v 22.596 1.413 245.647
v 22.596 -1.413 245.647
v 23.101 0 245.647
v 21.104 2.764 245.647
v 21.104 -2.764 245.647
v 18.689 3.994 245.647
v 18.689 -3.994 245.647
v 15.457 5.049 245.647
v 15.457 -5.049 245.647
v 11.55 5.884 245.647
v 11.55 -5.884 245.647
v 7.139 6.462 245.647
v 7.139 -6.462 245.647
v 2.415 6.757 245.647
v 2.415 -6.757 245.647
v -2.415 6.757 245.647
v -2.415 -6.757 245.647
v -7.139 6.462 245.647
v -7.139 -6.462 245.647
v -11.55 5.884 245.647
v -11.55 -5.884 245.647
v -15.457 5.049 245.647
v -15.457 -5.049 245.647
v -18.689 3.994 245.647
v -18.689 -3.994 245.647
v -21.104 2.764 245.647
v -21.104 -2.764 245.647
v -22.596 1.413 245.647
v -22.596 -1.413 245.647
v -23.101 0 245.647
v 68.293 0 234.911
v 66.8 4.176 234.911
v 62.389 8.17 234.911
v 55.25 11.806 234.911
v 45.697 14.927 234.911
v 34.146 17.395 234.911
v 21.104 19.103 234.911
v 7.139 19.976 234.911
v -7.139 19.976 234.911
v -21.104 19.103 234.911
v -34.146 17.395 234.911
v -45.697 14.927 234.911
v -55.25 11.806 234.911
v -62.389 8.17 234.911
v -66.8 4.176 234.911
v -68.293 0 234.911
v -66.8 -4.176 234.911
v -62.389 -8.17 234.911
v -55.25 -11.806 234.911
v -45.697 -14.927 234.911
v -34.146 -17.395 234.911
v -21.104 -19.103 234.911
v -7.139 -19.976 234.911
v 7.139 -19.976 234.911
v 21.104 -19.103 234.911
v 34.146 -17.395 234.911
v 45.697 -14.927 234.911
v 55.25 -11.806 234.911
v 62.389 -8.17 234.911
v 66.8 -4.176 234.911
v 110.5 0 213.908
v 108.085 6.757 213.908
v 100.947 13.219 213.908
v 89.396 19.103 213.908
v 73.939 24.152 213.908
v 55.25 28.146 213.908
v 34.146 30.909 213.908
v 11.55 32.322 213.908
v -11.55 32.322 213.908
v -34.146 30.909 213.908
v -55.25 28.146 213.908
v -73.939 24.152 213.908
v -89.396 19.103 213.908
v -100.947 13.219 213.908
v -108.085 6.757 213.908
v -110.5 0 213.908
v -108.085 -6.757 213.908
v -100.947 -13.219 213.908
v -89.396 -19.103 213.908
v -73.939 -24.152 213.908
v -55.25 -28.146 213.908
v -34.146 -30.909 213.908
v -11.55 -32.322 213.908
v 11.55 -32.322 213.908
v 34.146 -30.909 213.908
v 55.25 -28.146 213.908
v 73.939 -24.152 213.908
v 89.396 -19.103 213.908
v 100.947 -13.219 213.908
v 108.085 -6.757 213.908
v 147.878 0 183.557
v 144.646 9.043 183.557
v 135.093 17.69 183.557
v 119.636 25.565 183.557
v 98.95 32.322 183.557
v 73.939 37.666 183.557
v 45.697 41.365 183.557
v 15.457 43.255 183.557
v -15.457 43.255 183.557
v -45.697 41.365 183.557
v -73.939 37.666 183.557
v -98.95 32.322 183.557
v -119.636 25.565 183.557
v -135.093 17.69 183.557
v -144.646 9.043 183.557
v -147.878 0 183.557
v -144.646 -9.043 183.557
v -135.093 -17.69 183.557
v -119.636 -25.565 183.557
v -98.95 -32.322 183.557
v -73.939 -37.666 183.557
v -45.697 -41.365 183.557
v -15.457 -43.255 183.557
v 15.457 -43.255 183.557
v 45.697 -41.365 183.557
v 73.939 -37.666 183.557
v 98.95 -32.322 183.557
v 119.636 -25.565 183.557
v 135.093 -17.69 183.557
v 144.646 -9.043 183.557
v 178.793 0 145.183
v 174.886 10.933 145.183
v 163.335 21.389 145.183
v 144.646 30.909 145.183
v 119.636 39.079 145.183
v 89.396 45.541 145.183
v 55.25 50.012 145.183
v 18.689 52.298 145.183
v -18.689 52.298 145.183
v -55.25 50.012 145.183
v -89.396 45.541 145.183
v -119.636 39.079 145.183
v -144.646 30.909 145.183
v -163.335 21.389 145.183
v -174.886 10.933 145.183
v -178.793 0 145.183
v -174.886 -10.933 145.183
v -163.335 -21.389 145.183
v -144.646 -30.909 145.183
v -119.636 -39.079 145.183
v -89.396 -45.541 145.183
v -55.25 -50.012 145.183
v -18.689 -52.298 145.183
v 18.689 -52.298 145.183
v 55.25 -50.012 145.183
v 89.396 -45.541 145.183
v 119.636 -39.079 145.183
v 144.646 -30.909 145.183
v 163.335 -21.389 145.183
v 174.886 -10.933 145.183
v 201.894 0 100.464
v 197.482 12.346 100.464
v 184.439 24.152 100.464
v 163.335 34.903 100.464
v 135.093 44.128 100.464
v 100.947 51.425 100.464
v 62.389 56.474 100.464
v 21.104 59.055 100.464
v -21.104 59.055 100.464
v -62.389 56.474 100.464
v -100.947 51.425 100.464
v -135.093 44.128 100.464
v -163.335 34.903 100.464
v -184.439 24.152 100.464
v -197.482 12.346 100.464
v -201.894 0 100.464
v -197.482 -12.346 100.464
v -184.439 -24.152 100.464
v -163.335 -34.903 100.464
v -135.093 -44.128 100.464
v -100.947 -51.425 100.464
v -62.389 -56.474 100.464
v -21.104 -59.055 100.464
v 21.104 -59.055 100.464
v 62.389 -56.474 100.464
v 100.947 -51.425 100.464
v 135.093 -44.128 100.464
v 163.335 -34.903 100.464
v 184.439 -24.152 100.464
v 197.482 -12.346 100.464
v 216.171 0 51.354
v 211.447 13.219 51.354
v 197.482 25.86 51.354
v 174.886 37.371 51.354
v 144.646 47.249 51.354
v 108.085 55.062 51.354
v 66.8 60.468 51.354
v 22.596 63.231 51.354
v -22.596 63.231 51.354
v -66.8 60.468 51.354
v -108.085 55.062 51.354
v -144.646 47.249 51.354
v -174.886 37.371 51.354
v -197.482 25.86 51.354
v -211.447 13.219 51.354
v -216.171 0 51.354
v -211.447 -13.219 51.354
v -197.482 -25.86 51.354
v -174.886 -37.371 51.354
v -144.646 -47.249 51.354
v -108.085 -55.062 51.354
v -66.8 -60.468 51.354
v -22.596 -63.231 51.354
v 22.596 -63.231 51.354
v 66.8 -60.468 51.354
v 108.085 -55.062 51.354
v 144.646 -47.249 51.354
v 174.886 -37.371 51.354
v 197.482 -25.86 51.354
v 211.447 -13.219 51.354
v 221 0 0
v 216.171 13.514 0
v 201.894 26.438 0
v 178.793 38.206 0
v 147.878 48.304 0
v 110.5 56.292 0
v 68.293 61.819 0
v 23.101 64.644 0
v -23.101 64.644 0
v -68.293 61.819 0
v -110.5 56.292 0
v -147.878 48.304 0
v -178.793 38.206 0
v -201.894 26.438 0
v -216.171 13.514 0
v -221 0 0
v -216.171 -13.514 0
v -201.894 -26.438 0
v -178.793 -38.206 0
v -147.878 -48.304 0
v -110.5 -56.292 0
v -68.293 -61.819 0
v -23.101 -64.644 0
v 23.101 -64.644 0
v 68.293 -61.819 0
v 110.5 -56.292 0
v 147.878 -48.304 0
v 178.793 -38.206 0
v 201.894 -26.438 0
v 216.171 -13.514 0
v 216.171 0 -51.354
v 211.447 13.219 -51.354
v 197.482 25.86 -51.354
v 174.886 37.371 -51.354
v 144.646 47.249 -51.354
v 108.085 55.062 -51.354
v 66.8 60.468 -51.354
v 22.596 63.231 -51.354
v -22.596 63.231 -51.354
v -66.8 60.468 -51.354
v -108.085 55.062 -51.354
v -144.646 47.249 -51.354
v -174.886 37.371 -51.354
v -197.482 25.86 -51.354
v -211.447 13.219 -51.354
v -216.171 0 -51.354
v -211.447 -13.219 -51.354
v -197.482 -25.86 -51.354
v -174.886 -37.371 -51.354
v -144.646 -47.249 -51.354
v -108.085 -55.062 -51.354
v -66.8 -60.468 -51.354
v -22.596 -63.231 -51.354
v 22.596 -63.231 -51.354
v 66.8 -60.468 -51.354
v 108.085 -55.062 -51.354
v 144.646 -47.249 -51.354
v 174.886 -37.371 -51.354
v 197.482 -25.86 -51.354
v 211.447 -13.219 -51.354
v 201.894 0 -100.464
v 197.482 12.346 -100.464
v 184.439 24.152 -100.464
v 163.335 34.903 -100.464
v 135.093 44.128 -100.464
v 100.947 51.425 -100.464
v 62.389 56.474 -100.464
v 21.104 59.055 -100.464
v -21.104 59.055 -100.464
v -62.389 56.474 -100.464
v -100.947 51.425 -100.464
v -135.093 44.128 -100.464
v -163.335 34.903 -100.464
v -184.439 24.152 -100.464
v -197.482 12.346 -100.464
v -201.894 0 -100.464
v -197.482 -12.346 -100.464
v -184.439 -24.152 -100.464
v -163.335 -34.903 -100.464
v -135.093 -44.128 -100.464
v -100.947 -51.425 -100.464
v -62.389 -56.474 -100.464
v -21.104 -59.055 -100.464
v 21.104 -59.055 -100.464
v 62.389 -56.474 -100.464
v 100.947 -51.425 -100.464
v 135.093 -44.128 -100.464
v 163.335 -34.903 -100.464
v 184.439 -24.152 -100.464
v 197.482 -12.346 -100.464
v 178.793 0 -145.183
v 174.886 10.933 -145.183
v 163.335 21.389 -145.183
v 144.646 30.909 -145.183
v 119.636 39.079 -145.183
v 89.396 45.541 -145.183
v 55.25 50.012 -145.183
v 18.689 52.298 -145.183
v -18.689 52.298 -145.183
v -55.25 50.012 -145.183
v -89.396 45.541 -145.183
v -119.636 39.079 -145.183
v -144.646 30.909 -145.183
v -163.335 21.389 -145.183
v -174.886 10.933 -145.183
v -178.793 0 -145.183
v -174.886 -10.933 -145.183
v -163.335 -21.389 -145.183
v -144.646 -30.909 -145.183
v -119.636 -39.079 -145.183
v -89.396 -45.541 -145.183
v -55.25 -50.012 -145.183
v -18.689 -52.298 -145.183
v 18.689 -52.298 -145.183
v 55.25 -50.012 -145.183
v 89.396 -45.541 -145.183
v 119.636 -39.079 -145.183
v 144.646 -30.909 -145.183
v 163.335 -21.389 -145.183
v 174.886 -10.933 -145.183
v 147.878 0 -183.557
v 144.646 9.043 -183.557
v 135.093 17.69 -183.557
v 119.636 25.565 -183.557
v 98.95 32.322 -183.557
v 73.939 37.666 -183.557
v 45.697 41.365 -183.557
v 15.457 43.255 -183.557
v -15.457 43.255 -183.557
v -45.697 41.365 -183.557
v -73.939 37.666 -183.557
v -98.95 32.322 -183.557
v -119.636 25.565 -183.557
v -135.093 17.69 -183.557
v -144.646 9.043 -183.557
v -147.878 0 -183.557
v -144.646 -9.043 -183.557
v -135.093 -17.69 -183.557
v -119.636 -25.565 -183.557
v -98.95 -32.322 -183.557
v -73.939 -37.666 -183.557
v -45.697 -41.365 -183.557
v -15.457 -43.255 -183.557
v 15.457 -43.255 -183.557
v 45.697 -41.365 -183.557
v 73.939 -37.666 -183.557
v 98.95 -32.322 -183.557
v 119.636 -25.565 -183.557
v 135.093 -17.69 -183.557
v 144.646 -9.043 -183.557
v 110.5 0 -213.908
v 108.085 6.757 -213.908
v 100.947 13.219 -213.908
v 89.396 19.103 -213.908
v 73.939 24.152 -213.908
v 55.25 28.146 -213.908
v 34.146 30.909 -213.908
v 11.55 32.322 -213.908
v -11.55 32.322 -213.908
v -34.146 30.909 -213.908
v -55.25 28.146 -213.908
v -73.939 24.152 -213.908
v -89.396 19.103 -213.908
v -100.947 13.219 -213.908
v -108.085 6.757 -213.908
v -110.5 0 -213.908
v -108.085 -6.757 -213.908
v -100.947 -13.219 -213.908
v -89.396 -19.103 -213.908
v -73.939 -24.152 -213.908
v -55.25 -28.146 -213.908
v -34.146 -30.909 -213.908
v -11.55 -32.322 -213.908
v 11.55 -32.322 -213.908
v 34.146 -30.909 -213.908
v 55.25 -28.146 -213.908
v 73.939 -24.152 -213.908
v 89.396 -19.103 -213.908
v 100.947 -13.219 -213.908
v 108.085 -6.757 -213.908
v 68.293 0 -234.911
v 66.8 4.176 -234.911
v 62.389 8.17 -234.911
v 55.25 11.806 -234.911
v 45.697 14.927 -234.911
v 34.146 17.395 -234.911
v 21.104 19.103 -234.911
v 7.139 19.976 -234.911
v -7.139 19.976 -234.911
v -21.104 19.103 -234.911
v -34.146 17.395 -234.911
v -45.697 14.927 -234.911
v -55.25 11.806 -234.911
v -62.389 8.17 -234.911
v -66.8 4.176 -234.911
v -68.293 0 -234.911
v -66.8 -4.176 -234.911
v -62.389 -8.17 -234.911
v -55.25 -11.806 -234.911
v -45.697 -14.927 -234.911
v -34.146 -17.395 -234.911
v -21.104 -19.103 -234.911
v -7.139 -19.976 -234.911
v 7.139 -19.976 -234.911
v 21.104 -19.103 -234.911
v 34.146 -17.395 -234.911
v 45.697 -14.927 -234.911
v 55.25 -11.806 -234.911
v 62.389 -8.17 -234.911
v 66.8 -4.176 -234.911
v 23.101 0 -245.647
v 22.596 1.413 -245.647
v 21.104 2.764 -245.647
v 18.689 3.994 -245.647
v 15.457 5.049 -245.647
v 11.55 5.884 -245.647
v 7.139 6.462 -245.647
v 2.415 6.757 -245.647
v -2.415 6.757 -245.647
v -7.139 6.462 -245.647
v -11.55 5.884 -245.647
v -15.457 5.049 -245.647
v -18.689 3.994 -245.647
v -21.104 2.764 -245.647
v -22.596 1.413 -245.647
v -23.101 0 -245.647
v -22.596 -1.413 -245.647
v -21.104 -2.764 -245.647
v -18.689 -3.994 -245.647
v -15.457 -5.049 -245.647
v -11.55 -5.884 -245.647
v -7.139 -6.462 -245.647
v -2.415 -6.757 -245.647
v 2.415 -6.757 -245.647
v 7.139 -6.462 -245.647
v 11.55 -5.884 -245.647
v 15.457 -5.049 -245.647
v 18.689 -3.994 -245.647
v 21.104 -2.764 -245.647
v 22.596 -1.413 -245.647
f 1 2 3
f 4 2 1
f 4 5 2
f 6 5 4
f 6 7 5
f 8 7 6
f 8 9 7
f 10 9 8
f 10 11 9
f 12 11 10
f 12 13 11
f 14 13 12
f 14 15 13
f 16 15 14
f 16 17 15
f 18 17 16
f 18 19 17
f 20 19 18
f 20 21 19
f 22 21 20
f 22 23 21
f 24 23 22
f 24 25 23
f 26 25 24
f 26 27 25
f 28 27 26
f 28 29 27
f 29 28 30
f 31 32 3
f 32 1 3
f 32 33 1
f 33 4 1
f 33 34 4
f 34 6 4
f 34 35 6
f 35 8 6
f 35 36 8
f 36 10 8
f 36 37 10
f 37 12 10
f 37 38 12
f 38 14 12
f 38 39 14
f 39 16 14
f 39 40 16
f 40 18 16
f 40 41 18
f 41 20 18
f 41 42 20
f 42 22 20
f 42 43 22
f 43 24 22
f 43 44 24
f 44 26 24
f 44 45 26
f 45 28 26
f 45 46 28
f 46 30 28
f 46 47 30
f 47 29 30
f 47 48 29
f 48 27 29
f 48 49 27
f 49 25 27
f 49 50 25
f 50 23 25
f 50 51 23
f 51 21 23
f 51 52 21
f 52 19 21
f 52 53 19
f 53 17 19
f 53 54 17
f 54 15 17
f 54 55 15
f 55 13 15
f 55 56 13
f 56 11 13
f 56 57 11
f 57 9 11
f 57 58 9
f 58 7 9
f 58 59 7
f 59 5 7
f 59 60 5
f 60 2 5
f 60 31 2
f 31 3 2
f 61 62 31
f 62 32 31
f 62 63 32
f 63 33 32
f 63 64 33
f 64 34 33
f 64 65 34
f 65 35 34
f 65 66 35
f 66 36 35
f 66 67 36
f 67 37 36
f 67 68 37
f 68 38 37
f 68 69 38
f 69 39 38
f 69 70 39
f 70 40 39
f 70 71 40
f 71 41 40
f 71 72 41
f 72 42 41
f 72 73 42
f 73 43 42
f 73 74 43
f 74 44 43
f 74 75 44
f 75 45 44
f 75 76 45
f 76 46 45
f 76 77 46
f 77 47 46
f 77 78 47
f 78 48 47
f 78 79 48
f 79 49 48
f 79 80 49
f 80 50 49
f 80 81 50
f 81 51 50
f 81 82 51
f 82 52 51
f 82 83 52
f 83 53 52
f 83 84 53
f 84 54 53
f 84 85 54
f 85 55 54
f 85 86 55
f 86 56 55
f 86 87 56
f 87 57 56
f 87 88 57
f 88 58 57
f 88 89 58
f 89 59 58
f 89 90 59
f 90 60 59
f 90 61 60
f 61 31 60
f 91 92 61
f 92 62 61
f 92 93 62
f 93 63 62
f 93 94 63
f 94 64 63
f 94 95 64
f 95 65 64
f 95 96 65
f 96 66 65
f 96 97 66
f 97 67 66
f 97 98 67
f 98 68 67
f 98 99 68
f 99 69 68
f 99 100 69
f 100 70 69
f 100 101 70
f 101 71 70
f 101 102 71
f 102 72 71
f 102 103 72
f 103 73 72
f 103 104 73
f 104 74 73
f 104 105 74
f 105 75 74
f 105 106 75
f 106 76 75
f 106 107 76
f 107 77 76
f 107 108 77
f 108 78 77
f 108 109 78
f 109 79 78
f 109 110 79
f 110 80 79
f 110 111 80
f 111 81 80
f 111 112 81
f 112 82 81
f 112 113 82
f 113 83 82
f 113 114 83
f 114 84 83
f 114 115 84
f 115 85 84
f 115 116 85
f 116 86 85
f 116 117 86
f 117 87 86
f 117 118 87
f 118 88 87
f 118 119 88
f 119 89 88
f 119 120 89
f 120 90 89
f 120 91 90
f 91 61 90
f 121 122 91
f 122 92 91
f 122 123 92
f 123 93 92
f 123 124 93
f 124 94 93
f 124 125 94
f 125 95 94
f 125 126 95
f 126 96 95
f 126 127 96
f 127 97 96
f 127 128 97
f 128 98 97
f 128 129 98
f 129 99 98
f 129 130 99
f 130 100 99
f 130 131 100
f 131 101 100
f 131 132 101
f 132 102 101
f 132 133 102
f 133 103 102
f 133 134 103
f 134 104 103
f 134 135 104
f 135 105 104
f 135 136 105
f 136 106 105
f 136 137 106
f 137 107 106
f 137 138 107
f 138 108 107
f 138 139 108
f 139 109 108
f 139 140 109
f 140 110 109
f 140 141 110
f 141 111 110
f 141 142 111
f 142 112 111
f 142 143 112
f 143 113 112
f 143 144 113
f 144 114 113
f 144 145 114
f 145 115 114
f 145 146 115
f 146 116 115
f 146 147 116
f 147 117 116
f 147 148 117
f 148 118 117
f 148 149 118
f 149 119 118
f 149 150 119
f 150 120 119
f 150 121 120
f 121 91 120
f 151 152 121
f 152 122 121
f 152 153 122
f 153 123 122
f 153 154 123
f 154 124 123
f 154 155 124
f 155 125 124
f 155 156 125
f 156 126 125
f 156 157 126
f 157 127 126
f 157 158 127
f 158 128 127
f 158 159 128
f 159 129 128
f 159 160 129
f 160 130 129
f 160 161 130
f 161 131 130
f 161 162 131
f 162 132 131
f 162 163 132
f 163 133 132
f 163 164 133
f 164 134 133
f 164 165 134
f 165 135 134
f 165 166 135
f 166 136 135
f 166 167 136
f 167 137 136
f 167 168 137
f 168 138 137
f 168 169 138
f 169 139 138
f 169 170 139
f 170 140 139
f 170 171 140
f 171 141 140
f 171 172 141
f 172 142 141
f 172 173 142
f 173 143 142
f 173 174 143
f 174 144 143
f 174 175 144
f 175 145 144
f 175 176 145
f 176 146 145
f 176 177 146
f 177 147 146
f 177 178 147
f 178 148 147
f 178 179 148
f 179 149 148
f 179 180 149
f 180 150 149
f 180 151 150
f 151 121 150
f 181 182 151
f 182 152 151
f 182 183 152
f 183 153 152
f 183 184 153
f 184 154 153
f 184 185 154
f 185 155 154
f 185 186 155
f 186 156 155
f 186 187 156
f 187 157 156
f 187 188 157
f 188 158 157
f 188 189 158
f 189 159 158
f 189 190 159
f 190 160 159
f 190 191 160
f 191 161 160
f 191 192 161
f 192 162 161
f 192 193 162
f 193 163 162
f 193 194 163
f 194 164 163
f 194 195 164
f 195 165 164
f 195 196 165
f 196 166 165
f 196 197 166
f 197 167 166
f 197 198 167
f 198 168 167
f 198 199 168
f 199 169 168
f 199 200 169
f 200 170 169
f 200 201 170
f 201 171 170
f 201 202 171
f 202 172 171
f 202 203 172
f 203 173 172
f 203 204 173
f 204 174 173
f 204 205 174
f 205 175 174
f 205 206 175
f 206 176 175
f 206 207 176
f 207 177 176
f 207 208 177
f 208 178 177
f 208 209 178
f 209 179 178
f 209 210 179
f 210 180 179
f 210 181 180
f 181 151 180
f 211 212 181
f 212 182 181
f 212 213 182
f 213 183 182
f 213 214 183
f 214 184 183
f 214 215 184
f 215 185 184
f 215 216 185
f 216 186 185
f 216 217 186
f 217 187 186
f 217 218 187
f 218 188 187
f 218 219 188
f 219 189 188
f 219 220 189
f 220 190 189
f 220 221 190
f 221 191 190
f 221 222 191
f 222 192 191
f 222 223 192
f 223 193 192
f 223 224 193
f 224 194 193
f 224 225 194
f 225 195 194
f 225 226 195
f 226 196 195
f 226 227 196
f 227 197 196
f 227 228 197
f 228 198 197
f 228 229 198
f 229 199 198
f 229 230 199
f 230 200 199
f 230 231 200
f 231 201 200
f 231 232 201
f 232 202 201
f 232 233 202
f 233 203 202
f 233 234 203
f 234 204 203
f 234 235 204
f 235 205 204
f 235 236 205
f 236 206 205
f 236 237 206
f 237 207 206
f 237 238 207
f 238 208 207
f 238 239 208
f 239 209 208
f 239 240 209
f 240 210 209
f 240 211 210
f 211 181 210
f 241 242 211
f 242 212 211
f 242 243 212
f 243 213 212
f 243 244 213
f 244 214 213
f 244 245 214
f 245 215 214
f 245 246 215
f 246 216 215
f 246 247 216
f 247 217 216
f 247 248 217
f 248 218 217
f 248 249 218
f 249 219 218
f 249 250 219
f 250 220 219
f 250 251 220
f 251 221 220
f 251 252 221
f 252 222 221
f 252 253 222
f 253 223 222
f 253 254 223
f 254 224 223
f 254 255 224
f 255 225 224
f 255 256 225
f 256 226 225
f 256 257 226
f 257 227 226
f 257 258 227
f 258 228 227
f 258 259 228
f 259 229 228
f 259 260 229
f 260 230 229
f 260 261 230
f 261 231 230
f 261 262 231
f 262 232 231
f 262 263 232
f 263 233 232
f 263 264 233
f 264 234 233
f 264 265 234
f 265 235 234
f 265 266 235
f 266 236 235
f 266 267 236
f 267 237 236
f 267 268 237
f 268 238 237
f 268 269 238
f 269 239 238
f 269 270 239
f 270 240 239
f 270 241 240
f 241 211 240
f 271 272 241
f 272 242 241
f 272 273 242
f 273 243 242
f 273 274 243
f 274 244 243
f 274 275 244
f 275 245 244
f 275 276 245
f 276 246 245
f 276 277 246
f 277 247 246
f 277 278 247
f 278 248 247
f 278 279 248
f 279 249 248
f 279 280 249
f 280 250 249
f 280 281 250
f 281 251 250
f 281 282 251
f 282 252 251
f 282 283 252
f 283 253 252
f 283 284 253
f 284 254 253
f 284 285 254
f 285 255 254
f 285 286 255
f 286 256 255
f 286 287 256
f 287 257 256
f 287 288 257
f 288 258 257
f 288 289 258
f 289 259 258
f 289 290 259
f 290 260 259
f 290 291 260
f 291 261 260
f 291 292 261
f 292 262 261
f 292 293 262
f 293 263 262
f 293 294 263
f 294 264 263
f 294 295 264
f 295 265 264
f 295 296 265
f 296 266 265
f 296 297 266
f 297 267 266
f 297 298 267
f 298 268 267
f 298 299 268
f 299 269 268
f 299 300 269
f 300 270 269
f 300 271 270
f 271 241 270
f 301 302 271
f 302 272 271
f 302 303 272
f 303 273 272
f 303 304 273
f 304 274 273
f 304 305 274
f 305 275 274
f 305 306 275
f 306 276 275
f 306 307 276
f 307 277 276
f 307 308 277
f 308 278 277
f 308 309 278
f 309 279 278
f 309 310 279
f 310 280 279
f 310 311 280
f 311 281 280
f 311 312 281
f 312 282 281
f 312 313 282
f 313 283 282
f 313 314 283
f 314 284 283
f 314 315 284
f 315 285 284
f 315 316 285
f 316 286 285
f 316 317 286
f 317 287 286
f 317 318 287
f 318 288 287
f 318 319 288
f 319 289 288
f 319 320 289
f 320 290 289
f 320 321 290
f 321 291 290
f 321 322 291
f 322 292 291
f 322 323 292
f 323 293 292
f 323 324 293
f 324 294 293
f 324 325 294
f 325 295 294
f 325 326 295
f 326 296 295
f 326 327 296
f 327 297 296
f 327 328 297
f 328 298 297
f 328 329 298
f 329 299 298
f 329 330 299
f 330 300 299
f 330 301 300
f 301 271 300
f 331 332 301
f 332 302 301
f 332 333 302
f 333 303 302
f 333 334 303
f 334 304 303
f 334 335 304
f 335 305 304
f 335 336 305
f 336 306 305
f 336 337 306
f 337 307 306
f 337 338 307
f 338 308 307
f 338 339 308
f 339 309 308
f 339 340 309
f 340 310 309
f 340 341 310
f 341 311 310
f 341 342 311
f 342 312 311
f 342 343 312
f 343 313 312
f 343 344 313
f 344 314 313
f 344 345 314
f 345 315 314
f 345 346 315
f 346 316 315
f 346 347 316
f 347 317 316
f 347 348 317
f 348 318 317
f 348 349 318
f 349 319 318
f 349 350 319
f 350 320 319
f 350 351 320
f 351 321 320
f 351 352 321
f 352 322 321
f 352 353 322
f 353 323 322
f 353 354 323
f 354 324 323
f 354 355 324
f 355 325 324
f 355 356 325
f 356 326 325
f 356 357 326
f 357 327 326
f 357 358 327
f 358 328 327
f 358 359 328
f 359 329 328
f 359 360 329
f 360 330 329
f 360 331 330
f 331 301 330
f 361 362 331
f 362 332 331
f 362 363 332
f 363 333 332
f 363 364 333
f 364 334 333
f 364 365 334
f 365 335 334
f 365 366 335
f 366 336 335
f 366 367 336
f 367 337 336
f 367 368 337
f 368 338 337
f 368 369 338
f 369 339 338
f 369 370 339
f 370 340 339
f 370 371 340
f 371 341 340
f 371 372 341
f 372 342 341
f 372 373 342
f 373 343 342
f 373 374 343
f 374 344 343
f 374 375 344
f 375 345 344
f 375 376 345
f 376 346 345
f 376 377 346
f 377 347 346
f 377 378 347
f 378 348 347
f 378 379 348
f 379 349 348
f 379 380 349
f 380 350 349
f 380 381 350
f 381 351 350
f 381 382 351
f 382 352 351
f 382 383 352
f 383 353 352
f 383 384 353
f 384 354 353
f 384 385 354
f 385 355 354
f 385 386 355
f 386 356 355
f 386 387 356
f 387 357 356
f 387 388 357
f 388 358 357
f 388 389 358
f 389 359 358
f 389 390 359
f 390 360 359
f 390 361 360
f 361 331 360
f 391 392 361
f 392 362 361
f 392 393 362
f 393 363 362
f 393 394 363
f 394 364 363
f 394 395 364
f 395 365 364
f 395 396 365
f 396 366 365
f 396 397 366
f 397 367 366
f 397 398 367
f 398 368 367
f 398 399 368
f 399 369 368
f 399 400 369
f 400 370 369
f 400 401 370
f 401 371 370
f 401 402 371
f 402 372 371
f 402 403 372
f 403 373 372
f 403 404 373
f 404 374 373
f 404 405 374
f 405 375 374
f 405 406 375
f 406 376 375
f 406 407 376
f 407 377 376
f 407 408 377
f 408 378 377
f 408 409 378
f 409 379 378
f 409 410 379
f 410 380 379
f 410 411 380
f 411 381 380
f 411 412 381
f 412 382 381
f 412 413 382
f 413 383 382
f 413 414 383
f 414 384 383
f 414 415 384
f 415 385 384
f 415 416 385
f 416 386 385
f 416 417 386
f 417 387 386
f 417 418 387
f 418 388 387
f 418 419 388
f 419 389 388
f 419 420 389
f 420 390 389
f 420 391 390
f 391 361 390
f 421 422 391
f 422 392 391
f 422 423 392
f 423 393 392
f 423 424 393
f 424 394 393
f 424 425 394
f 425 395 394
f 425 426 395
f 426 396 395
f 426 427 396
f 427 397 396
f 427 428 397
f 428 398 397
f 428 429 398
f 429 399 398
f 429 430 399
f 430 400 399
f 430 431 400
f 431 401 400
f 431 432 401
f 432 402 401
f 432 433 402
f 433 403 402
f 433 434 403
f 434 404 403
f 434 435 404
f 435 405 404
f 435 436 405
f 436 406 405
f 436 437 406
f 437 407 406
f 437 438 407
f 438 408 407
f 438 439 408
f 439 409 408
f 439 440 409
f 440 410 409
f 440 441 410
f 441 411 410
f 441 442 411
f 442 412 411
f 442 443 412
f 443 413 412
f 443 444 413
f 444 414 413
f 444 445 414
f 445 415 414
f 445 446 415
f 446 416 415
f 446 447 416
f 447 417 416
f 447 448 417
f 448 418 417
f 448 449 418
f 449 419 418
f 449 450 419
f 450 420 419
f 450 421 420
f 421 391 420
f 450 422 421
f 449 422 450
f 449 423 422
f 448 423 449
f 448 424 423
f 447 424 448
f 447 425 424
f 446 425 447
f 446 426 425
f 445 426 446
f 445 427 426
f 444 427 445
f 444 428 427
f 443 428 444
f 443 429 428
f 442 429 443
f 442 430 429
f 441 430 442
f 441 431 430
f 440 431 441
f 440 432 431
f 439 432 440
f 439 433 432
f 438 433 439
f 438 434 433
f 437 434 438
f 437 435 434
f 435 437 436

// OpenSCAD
// Generated by SolidPython 1.0.1 on 2020-07-29 00:46:52


scale(v = [17, 5, 19]) {
	sphere(r = 13);
}
/***********************************************
*********      SolidPython code:      **********
************************************************
 
# import packages: SolidPython
from solid import *
from solid.utils import *
from itertools import chain, combinations, permutations


class Resize:

    def __init__(self, scad_file):
        self.scad_file = scad_file
        #self.scad_file = import_scad(scad_file)
        # cone/cylinder param:
        self.r1 = 0
        self.r2 = 0
        self.h = 0
        # rectangular prism param:
        self.w = 0
        self.l = 0
        # ellipse param:
        self.r = 0

    # import OpenScad code (file name corresponds to shape)


    # classify shape + parameters
    def assign(self, param1, param2, param3):
        if self.scad_file == 'cone.scad':
            self.r1 = param1
            self.r2 = param2
            self.h = param3
        elif self.scad_file == 'cylinder.scad':
            self.r1 = param1
            self.r2 = param2
            self.h = param3
        elif self.scad_file == 'rectangularPrism.scad':
            self.h = param1
            self.l = param2
            self.w = param3
        else:
            self.r = param1
            self.h = param2

    # resize parameters
    def iterate(self):
        x = range(3, 20, 2)
        i = 1
        if self.scad_file == 'cone.scad':
            tempList = list(permutations(x, 2))
            for temp in tempList:
                param1 = temp[0]
                param2 = temp[1]
                filepath = 'produced_scad_files/' + 'cone' + str(param1) + '_' + str(param2) + '_' + '.scad'
                scad_render_to_file(cylinder(h=param1, r1=param2, r2=0), filepath)

        elif self.scad_file == 'cylinder.scad':
            tempList = list(permutations(x, 3))
            for temp in tempList:
                param1 = temp[0]
                param2 = temp[1]
                filepath = 'produced_scad_files/' + 'cylinder' + str(param1) + '_' + str(param2) + '_' + '.scad'
                scad_render_to_file(cylinder(h=param1, r1=param2, r2=param2), filepath)

        elif self.scad_file == 'rectangularPrism.scad':
            tempList = list(permutations(x, 3))
            for temp in tempList:
                param1 = temp[0]
                param2 = temp[1]
                param3 = temp[2]
                filepath = 'produced_scad_files/' + 'rectangularPrism' + str(param1) + '_' + str(param2) + '_' + str(
                    param3) + '.scad'
                scad_render_to_file(cube(size=(param1, param2, param3)), filepath)

        elif self.scad_file == 'ellipse.scad':
            tempList = list(permutations(x, 4))
            for temp in tempList:
                param1 = temp[0]
                param2 = temp[1]
                param3 = temp[2]
                param4 = temp[3]
                filepath = 'produced_scad_files/' + 'ellipse' + str(param1) + '_' + str(param2) + '_' + str(param3) + '_' + str(param4) + '.scad'
                scad_render_to_file(scale([param1, param2, param3])(sphere(r=param4)), filepath)

    def render_to_scadfile(self):
        scad_render_to_file(scad, 'example.scad') 
 
************************************************/
